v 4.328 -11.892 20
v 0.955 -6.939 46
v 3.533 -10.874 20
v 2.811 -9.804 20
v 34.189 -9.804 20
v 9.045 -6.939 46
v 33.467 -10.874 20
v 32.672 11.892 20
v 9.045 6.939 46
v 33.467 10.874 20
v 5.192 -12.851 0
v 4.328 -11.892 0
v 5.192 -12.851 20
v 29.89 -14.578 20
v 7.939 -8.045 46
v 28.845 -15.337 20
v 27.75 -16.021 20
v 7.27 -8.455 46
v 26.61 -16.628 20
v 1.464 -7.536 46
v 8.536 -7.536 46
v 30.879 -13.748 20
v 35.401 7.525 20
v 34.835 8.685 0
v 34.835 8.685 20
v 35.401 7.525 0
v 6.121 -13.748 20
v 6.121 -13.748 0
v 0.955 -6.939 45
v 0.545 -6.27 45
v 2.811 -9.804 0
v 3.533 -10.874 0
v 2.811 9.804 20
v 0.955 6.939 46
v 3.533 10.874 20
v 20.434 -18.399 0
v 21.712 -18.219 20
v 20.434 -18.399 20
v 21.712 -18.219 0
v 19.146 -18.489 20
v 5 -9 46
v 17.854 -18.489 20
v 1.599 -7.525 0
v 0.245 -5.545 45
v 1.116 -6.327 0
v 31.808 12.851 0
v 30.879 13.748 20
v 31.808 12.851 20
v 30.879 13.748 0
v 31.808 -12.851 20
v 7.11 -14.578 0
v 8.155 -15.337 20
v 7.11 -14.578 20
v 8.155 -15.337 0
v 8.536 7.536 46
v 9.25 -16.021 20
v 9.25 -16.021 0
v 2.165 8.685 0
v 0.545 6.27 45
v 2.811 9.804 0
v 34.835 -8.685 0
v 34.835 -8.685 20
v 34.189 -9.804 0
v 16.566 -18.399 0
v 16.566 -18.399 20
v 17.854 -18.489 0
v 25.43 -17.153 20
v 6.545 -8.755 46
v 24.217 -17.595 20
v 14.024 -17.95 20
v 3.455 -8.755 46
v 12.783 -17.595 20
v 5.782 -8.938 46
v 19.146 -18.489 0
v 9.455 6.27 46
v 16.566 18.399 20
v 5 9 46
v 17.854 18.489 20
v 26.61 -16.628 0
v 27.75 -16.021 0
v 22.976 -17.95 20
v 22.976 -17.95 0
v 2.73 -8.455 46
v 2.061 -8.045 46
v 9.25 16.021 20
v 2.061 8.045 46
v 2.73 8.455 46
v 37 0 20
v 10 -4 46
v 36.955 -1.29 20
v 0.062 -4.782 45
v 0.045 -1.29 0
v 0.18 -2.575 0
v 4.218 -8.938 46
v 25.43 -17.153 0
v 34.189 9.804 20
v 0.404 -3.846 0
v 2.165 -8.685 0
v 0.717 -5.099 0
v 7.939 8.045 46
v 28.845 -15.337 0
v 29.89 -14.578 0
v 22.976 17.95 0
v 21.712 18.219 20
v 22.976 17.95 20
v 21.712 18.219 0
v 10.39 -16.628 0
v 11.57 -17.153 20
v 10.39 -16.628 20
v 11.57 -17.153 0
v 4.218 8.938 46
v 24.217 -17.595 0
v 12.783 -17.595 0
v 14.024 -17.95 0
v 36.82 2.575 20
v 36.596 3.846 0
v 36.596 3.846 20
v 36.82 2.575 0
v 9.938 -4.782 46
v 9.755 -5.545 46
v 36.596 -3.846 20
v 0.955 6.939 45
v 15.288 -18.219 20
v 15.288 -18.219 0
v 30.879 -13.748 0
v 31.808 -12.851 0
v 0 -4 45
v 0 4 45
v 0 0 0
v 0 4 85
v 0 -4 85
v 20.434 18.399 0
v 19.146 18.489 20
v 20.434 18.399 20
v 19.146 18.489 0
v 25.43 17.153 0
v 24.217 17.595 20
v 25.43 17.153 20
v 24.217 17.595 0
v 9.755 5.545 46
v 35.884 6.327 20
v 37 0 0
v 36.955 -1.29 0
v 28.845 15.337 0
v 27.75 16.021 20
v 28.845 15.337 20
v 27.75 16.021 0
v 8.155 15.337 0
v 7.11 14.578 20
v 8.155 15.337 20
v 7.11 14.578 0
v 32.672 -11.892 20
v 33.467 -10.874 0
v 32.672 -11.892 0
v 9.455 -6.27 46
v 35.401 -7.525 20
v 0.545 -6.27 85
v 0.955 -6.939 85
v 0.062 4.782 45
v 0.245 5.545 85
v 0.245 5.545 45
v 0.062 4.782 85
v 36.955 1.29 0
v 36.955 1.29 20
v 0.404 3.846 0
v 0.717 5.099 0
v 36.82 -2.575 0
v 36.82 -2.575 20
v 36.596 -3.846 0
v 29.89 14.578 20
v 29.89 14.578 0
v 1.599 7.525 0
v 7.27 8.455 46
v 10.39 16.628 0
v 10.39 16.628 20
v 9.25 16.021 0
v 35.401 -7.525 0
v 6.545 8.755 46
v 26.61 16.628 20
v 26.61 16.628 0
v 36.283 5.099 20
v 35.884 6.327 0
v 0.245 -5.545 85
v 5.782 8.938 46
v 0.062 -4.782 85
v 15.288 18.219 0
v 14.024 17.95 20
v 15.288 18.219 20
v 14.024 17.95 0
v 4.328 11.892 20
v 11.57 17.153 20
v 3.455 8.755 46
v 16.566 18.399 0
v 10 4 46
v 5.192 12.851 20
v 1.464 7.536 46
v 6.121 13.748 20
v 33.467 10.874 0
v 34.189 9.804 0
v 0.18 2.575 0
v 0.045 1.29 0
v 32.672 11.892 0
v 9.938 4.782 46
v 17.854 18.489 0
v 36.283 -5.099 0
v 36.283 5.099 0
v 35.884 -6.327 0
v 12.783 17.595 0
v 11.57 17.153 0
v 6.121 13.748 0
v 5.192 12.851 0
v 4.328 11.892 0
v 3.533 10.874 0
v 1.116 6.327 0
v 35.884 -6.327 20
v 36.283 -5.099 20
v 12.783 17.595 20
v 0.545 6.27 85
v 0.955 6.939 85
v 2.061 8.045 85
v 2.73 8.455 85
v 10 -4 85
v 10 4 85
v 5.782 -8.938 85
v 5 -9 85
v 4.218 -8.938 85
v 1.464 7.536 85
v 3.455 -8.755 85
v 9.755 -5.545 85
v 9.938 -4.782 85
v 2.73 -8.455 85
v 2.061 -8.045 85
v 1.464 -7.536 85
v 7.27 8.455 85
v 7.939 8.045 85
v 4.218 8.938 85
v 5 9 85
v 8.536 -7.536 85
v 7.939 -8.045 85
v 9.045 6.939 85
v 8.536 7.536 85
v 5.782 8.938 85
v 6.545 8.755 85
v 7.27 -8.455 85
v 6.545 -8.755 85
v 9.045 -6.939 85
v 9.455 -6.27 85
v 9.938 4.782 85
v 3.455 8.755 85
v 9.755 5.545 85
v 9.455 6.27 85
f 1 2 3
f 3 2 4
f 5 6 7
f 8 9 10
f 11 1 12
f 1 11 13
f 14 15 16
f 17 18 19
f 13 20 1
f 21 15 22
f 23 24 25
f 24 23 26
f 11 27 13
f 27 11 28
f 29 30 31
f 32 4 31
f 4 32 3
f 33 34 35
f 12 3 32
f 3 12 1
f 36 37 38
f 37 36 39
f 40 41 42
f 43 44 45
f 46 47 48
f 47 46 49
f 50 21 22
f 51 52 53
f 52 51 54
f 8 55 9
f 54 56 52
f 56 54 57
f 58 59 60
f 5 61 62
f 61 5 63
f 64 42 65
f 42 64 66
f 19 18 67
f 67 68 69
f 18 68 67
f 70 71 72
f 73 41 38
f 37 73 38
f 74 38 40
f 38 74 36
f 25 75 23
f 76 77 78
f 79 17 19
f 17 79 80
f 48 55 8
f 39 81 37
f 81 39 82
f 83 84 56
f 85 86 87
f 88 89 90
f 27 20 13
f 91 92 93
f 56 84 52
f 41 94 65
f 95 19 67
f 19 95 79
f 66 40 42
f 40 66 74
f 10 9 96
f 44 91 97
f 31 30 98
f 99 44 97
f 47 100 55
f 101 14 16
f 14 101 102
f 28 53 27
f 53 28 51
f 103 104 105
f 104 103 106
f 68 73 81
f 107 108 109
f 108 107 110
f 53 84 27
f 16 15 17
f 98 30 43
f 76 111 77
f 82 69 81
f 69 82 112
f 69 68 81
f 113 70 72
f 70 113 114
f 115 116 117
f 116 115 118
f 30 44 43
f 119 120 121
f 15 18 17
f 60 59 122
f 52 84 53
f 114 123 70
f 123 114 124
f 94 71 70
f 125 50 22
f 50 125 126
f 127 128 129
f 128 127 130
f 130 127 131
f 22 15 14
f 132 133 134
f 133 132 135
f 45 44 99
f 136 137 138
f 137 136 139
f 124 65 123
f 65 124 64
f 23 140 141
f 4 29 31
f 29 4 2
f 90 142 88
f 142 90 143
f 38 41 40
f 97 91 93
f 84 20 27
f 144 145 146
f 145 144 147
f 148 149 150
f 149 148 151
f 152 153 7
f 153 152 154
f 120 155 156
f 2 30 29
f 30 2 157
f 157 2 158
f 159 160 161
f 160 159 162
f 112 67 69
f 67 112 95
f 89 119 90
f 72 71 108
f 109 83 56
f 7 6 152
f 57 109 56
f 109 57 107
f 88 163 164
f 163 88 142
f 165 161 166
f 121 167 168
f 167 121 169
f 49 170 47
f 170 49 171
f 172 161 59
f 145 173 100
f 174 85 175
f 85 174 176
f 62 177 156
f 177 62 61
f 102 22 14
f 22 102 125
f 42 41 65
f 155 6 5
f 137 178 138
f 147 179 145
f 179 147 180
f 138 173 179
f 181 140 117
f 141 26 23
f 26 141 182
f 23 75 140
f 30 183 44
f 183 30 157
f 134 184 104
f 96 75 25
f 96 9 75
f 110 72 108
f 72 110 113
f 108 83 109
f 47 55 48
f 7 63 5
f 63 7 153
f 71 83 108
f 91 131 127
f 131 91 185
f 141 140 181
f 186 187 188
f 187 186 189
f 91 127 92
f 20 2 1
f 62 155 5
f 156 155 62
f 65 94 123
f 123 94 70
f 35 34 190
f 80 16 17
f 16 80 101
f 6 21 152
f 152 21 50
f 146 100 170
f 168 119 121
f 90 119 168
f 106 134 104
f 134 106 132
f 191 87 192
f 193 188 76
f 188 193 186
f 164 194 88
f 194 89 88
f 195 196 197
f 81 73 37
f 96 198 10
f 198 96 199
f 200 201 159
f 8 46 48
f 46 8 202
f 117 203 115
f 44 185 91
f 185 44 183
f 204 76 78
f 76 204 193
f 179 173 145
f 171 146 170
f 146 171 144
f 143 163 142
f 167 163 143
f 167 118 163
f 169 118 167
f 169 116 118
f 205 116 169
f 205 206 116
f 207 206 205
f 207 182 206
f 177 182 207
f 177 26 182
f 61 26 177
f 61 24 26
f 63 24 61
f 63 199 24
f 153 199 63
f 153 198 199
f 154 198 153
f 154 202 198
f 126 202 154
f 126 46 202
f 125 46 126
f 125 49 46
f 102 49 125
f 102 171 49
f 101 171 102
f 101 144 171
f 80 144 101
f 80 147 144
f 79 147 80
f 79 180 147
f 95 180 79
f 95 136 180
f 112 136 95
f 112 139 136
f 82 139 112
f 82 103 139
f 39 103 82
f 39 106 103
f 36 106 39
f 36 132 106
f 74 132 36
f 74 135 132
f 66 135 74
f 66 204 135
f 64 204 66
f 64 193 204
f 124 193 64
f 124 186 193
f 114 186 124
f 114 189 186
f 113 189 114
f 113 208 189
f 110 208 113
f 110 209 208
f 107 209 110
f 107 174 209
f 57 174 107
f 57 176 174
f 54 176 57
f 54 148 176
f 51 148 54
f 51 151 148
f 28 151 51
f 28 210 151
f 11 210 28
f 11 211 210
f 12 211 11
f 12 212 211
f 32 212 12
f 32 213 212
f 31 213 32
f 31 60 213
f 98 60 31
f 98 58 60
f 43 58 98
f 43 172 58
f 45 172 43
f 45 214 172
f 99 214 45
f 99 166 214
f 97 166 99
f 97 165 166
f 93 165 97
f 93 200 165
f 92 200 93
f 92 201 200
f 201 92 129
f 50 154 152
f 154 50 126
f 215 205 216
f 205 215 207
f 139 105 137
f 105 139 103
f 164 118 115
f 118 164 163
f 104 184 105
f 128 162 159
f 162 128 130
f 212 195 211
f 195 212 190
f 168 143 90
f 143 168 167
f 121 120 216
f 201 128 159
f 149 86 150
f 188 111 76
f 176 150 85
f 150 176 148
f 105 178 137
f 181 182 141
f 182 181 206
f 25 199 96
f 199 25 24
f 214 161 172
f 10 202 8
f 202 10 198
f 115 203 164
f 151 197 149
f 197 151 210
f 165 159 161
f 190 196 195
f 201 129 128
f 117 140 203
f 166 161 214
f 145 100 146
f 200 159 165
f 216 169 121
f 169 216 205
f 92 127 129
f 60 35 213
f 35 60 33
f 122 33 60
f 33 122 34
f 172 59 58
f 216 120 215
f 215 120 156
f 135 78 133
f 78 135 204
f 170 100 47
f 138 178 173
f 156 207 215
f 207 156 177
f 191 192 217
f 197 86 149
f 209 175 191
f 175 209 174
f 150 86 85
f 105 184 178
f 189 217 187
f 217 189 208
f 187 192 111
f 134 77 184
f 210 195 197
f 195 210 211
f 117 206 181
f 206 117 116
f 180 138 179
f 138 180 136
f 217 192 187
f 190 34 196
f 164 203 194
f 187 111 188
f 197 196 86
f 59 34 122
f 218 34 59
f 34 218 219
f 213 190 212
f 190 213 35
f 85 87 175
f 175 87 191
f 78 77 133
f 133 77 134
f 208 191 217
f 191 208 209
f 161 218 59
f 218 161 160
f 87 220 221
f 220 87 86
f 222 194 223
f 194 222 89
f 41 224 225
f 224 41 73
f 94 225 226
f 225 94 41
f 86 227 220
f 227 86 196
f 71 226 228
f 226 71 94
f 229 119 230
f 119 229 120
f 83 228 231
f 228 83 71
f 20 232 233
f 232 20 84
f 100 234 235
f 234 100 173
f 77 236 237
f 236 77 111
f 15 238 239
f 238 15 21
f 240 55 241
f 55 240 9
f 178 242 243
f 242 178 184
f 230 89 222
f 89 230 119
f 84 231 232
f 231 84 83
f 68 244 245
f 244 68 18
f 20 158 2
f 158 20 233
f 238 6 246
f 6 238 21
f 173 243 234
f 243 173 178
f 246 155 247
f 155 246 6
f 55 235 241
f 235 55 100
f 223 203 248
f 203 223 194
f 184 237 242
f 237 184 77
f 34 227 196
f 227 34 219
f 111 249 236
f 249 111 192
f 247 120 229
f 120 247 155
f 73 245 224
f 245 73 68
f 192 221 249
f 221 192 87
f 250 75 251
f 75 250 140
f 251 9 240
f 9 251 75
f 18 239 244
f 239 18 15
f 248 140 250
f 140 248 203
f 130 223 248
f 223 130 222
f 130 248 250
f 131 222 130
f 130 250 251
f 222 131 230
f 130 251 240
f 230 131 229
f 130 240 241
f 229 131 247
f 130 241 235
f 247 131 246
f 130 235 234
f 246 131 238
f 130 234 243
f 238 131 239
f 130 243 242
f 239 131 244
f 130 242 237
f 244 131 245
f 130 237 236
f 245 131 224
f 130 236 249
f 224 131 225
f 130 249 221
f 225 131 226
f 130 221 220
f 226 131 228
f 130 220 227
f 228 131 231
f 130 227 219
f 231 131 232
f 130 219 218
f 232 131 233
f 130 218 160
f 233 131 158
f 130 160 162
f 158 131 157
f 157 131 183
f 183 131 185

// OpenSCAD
$fs=0.8; // def 1, 0.2 is high res
$fa=4;//def 12, 3 is very nice
%translate([0,0,-0.5])cube([200,200,1],center=true); //build platform

outer_rad = 37 / 2;
inner_rad = 32.5 / 2;

module tube(h) {
		hull() {
			translate([0,-4,0]) cylinder(h,5,5);
			translate([0,4,0]) cylinder(h,5,5);
		}
}

module base(h,out,in) {
		cylinder(h,out,out);
}

hull() {
	translate([5,0,45]) tube(1);
	translate([outer_rad,0,0]) base(20,outer_rad,inner_rad);
}

translate([5,0,45]) tube(40);
